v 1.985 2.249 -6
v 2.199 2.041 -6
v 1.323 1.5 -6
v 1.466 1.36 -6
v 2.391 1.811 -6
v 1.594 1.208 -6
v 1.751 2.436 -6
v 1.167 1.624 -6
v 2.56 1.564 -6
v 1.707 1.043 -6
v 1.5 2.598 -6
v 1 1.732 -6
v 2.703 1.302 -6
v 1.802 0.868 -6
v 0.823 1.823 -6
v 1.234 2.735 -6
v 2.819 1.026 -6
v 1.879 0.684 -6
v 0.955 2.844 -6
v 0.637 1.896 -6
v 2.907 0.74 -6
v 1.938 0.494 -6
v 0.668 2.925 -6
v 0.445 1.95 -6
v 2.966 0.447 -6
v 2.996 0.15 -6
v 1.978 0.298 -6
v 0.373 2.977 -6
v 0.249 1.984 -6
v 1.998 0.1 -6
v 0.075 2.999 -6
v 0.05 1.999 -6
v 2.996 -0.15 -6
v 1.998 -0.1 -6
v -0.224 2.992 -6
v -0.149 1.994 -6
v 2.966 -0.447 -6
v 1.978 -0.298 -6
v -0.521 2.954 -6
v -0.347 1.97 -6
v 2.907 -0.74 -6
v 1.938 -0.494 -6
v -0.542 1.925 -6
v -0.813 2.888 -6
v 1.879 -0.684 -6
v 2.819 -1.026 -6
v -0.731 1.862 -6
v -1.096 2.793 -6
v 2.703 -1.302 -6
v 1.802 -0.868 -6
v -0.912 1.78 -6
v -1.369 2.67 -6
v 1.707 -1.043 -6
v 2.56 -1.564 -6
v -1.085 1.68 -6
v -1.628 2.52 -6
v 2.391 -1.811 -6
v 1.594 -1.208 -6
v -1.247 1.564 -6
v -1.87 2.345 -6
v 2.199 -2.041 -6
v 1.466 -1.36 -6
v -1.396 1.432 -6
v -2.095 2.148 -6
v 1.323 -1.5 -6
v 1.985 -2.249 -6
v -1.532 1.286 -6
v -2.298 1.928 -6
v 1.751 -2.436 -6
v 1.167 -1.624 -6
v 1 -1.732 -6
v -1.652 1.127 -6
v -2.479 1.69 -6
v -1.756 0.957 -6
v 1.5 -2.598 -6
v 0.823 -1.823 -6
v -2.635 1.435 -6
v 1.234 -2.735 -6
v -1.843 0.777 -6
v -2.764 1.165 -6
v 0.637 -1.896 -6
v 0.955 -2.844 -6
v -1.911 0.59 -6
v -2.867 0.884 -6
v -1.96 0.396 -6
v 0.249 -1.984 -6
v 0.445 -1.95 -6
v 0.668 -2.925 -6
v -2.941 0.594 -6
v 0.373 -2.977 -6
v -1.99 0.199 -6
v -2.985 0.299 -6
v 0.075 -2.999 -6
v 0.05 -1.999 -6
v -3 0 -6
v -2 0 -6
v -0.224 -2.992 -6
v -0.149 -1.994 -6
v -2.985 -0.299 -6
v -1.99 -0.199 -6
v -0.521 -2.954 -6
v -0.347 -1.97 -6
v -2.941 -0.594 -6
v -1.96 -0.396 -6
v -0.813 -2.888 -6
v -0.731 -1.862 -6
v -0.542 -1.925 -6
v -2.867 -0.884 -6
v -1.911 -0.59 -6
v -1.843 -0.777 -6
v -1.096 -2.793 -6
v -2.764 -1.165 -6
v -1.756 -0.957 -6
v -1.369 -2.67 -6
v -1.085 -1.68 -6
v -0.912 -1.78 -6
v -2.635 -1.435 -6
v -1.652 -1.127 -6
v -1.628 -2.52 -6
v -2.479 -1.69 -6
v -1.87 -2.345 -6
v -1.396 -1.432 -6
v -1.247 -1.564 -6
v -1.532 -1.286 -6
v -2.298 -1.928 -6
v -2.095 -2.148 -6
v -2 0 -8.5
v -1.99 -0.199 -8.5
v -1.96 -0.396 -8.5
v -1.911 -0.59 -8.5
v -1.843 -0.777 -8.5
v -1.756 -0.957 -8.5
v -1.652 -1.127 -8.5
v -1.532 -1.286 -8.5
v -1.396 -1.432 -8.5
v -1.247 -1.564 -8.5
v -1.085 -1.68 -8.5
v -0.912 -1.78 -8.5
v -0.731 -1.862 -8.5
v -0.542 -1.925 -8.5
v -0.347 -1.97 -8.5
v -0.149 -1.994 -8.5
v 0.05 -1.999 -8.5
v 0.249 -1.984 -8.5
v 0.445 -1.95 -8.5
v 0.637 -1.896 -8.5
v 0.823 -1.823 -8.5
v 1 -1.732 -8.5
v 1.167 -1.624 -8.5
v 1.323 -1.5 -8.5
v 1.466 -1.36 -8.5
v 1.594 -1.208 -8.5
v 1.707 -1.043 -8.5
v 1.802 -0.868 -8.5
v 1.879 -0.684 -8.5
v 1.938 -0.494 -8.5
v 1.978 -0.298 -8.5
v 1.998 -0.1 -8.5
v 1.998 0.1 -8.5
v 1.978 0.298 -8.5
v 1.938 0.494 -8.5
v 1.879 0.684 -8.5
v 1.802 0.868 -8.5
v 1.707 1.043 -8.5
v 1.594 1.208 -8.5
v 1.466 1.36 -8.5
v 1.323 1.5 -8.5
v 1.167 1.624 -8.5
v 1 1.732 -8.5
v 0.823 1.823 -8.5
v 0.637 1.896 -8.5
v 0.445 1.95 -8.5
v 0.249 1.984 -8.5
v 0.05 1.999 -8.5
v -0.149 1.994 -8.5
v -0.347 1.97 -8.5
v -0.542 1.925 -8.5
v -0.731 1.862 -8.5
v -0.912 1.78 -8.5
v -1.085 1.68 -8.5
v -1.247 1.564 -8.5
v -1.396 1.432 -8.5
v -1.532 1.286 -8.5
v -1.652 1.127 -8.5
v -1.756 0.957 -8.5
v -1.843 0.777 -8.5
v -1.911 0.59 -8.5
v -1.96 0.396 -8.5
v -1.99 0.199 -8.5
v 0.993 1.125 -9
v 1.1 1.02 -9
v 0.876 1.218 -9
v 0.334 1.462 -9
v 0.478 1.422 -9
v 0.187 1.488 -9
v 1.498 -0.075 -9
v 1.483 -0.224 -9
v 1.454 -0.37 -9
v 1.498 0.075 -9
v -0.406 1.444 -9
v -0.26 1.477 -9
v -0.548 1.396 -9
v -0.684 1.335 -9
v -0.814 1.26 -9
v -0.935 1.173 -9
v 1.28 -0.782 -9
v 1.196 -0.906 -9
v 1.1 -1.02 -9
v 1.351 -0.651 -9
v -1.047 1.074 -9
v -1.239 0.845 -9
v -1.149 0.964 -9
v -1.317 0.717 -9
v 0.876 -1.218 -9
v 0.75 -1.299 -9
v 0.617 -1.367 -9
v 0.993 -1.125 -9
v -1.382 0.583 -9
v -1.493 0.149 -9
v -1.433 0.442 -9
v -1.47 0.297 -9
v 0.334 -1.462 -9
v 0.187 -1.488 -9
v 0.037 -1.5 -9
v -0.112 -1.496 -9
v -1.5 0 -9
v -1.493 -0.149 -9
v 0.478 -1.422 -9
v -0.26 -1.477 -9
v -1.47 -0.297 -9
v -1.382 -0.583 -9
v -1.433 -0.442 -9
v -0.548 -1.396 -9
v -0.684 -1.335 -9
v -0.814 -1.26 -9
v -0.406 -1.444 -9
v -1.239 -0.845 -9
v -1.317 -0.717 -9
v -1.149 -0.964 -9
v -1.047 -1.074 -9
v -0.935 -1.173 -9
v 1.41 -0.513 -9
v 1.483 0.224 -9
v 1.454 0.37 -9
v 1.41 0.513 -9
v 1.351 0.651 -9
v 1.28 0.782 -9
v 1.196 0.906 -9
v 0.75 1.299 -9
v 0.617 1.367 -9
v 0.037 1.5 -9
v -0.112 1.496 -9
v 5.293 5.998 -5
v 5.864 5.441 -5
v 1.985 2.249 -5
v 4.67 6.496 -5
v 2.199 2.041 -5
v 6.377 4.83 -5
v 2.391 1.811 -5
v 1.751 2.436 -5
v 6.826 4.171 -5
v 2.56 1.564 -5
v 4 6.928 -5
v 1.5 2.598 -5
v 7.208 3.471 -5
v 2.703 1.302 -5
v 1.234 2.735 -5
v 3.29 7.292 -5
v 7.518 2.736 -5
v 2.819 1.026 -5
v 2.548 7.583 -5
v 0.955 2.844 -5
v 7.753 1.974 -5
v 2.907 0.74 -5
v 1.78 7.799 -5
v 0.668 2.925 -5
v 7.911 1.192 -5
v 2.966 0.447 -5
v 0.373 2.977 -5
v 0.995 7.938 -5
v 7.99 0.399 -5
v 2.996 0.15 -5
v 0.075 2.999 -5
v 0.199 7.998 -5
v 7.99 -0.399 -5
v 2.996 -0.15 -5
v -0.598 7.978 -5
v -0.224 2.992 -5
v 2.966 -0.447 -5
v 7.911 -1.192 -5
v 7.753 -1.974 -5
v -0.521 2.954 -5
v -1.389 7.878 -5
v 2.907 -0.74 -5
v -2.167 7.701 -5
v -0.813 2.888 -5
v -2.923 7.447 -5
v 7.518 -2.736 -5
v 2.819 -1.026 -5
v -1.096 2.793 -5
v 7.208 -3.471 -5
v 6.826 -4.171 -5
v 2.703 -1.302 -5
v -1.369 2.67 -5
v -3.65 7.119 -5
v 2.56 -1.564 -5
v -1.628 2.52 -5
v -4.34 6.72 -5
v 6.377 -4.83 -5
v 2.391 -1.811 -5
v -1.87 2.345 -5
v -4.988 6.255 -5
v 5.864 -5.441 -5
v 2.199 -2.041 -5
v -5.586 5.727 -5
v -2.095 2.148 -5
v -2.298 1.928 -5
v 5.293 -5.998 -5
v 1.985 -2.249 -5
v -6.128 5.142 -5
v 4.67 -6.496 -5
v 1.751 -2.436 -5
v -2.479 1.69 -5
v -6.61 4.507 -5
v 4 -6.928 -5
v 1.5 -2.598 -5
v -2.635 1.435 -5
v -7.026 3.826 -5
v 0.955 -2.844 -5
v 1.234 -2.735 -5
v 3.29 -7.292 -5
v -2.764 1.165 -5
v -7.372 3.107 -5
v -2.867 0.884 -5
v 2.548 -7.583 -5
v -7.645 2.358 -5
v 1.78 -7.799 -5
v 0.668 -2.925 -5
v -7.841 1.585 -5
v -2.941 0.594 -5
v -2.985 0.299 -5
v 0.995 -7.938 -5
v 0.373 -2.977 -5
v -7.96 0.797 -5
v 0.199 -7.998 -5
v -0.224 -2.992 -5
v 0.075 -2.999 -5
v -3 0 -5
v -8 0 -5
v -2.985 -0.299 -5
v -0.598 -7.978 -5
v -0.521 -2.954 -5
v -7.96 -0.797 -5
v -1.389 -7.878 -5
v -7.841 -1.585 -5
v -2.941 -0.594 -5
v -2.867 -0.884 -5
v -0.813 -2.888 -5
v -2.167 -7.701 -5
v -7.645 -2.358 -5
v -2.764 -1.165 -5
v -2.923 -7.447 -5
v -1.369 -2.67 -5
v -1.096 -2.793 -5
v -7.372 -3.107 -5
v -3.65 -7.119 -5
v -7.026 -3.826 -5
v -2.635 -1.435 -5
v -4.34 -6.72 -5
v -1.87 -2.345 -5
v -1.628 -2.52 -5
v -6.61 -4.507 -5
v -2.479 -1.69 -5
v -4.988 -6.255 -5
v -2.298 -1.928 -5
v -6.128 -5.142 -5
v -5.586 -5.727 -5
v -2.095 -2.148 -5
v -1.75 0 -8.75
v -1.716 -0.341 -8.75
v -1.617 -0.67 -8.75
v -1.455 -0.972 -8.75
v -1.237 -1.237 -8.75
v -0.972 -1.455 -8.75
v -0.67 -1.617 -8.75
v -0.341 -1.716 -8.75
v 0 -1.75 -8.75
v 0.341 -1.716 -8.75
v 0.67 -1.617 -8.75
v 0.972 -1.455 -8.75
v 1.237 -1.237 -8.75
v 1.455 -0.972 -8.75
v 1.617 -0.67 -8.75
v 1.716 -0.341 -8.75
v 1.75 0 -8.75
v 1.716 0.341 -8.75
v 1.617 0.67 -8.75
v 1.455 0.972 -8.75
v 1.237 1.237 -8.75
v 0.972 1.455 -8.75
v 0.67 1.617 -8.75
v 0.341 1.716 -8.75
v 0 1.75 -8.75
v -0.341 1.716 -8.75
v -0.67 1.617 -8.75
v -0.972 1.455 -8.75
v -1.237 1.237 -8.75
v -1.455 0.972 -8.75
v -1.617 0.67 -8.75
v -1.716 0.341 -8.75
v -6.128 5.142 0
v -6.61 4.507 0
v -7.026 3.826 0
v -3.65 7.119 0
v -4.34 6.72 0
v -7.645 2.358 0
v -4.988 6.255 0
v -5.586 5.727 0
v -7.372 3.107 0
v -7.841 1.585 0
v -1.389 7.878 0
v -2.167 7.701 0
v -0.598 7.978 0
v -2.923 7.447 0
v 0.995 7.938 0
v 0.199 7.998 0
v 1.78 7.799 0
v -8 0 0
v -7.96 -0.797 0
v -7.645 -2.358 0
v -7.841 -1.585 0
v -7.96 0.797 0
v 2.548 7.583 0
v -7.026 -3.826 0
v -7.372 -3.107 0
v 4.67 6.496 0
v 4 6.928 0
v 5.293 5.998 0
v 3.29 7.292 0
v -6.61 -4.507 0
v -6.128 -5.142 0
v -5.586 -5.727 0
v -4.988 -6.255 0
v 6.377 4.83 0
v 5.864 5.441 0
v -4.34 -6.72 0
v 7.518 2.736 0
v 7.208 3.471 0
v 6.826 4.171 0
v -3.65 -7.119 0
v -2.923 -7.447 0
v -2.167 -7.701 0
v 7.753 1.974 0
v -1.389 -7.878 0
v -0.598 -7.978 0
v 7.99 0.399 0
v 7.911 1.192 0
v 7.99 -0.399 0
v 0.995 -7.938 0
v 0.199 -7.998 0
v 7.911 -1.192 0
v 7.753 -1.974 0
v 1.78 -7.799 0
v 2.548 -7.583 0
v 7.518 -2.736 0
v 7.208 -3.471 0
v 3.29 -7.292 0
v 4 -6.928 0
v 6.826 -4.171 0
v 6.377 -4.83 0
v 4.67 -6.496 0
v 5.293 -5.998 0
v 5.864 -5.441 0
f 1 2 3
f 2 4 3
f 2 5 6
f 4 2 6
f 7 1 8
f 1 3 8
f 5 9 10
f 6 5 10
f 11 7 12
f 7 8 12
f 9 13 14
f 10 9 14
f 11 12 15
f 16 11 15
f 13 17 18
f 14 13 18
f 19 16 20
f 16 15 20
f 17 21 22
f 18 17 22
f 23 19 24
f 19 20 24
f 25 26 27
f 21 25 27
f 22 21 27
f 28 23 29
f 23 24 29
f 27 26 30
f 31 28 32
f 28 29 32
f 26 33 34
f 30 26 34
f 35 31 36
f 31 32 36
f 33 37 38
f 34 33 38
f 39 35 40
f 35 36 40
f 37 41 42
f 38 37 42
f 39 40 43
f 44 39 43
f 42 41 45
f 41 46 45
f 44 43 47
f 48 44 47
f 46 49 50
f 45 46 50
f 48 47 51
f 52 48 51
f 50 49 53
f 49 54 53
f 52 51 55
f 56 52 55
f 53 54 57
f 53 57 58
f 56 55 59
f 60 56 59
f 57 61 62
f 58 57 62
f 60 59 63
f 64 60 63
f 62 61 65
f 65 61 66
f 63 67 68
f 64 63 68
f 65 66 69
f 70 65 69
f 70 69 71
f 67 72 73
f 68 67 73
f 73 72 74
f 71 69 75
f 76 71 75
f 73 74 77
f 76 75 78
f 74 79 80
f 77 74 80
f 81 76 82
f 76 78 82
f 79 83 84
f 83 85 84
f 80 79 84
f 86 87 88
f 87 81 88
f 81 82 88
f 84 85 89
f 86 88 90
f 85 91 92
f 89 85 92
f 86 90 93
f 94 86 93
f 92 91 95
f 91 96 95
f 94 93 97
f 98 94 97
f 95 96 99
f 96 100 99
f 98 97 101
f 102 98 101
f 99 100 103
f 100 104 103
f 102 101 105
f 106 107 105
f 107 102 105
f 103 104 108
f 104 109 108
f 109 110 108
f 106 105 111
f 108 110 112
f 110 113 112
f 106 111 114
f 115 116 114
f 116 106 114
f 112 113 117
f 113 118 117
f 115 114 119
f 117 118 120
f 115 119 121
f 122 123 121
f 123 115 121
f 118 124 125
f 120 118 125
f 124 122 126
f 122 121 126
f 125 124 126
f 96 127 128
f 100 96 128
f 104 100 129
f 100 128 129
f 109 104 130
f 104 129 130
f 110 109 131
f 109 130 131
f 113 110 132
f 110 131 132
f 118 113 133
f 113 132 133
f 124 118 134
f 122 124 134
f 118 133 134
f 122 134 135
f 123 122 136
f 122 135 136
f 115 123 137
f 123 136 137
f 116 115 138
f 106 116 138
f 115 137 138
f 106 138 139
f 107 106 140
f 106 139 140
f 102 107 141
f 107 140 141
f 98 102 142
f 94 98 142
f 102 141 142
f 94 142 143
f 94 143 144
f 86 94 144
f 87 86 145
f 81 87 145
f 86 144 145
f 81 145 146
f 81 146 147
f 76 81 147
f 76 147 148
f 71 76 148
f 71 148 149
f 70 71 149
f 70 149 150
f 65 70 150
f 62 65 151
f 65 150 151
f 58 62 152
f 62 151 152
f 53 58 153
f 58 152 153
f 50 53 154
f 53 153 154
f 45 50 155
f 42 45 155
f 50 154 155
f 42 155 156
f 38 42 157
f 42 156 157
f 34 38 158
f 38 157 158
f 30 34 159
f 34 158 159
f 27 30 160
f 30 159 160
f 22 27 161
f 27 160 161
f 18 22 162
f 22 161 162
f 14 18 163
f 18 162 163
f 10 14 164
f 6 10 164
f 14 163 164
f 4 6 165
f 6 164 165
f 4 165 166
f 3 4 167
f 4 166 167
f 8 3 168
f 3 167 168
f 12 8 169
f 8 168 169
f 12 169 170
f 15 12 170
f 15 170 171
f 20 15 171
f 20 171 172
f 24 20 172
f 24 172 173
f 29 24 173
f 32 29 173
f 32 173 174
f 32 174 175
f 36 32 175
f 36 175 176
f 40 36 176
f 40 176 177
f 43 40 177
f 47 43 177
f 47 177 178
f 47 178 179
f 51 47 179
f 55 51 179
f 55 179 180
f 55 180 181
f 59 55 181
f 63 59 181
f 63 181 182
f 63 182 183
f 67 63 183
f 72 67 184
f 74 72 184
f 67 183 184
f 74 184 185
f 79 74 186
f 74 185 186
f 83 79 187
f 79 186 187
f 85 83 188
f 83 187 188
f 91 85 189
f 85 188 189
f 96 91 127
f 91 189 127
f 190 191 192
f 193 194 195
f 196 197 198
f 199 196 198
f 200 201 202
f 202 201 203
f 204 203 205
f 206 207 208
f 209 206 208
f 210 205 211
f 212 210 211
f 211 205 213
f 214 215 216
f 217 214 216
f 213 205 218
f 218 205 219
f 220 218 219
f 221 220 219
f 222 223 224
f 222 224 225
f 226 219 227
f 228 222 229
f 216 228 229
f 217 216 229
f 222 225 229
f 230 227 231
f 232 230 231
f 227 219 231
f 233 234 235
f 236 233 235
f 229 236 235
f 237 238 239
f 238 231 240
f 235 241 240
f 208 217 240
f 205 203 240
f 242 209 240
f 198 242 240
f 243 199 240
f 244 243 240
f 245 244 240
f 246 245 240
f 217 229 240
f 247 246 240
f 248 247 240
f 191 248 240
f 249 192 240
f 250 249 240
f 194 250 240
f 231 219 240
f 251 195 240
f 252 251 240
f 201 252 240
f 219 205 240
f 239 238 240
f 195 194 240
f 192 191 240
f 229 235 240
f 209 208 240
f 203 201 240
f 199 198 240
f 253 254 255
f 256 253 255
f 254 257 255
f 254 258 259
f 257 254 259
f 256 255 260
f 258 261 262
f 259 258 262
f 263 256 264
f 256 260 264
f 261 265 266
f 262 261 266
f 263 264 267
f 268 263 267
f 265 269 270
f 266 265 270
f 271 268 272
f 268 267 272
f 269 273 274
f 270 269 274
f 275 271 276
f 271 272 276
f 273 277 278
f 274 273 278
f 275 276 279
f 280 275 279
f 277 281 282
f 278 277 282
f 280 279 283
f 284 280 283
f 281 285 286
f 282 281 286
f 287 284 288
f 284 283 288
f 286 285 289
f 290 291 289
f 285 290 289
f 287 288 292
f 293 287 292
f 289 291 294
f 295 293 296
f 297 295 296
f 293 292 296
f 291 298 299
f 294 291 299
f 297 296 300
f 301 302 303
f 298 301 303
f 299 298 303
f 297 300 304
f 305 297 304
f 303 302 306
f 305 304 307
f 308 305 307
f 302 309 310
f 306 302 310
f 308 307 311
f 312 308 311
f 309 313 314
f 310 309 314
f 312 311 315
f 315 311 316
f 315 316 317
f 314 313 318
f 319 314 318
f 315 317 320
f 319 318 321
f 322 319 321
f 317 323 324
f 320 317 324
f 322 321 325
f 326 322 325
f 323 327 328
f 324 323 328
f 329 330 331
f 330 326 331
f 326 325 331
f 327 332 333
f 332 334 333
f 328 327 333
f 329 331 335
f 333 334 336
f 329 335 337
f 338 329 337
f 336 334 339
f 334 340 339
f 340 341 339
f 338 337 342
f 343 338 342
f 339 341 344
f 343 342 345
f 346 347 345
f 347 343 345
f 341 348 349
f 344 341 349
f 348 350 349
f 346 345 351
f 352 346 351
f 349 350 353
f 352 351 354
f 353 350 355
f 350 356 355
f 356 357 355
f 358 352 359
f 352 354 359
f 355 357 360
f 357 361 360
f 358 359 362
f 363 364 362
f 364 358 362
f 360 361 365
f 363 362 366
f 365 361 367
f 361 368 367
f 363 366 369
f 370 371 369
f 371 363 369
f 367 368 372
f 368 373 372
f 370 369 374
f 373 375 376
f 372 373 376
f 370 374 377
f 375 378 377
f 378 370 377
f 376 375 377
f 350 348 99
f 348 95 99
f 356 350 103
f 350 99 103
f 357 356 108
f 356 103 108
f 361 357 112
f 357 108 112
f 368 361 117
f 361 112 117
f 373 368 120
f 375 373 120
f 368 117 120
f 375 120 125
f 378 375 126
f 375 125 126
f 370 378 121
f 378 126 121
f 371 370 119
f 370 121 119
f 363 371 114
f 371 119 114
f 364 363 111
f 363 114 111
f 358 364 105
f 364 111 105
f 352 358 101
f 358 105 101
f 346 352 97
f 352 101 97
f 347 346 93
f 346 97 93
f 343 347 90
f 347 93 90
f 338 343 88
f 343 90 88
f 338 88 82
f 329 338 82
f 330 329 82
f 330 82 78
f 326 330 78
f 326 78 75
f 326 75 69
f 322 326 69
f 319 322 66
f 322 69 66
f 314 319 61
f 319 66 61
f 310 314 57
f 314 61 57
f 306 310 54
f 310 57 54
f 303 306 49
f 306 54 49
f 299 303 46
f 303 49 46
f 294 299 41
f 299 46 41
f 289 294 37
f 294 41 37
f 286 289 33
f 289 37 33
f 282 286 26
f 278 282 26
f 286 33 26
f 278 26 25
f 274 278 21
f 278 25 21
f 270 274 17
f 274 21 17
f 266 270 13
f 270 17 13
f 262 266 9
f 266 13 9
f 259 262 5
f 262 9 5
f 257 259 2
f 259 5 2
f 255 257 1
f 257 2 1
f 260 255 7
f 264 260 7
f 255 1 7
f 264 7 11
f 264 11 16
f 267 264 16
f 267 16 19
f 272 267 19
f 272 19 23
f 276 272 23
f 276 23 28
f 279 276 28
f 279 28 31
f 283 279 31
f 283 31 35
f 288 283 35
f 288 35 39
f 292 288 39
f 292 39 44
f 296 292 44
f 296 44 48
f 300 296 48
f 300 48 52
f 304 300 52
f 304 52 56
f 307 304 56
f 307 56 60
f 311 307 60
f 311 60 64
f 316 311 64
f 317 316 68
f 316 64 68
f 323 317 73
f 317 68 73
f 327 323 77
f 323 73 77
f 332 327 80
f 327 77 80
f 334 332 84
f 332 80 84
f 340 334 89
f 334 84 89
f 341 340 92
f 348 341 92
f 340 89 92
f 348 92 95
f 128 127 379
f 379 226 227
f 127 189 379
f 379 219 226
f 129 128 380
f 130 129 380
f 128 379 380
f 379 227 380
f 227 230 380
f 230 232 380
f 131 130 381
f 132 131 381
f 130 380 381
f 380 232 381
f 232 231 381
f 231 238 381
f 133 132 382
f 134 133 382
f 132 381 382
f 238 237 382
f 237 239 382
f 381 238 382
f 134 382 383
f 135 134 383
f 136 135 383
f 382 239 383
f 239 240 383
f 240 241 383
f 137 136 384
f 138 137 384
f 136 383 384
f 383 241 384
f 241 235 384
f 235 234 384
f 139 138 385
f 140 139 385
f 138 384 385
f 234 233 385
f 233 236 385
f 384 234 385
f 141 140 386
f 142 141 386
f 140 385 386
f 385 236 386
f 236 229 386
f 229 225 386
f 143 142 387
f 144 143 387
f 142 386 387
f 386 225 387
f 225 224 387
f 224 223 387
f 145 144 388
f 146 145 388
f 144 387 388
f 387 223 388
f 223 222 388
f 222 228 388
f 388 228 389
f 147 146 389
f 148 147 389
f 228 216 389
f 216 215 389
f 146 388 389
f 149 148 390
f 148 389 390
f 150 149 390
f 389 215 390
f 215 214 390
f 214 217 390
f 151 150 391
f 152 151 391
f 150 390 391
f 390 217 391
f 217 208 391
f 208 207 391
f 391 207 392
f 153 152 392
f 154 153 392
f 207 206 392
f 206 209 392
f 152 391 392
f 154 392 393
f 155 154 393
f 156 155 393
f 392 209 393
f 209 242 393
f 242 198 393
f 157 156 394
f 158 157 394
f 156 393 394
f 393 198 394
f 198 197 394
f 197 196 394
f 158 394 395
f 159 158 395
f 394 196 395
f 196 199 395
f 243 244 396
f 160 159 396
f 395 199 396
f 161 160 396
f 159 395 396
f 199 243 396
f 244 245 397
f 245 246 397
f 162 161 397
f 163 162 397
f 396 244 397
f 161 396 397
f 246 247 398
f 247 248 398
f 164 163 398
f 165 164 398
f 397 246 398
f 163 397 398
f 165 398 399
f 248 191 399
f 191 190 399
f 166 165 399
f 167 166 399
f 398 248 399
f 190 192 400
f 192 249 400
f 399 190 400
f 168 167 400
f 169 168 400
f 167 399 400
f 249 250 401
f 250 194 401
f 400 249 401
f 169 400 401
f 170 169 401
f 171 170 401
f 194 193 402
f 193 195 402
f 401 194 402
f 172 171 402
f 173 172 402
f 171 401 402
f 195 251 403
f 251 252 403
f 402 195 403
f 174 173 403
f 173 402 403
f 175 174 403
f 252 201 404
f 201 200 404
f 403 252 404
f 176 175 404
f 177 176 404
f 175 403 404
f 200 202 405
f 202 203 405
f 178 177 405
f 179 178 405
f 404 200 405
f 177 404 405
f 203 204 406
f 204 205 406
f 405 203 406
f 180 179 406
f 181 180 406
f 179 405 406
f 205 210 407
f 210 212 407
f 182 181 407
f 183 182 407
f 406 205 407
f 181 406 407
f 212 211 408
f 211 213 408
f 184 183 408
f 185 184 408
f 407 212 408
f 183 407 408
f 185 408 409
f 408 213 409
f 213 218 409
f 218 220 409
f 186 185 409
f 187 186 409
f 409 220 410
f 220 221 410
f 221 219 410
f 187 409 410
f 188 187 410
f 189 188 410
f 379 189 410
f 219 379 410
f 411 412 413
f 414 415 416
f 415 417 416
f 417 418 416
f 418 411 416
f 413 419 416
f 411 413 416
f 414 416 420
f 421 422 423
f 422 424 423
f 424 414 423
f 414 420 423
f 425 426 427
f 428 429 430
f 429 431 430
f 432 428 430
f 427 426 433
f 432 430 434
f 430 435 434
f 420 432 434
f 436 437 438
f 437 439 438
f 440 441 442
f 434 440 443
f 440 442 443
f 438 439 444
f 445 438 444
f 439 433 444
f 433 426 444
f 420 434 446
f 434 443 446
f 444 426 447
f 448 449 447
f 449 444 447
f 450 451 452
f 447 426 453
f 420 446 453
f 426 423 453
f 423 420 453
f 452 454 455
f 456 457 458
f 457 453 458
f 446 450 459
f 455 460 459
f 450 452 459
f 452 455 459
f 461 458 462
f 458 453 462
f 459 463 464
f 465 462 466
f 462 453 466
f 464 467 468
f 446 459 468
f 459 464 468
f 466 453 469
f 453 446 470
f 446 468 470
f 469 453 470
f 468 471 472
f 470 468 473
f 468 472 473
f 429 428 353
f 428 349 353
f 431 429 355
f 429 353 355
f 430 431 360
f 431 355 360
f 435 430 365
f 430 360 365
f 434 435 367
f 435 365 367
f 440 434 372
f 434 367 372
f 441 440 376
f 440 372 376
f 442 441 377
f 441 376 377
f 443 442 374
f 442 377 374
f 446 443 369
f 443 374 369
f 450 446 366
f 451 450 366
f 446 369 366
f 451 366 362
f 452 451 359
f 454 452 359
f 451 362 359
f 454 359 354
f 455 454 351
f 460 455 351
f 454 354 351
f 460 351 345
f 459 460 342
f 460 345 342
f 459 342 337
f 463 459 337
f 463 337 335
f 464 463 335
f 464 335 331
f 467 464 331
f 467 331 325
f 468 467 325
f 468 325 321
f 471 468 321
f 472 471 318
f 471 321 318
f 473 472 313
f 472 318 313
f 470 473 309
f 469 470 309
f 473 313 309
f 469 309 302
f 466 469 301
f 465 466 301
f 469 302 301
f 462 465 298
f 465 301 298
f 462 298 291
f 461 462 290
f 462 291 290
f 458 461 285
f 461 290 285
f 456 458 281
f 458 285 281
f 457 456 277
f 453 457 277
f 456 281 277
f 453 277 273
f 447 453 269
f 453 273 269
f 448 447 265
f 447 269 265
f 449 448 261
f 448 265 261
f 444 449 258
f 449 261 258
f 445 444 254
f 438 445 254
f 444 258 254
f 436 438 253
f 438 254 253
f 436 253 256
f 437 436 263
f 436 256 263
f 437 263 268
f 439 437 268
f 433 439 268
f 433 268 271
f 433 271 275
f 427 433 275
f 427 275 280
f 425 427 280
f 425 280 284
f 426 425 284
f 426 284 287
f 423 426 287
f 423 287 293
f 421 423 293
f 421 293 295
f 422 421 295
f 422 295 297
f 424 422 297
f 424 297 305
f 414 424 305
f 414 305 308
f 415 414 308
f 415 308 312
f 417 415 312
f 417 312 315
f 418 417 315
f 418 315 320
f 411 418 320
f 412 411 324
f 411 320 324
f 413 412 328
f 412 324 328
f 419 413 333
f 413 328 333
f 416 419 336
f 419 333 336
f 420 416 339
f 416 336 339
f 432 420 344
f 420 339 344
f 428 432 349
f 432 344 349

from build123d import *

# Parameters (mm, degrees)
CHAMFER_1_SIZE = 0.5


with BuildPart() as part:
    # Эскиз1 → Revolve 325 (revolve)
    with BuildSketch(Plane(origin=(0, 0, 0), x_dir=(1, 0, 0), z_dir=(0, 1, 0)), mode=Mode.PRIVATE) as revolve_325_sk:
        Polygon((0, 0), (8, 0), (8, 5), (3, 5), (3, 6), (2, 6), (2, 9), (0, 9), align=None)
    revolve(revolve_325_sk.sketch.rotate(Axis((0, 0, -9), (0, 0, 1)), 180), axis=Axis((0, 0, -9), (0, 0, 1)))

    # Фаска1
    chamfer_1_edges = [part.edges().sort_by_distance(p)[0] for p in [
        (2, 0, -9),
    ]]
    chamfer(chamfer_1_edges, length=CHAMFER_1_SIZE)


solid = part.part
